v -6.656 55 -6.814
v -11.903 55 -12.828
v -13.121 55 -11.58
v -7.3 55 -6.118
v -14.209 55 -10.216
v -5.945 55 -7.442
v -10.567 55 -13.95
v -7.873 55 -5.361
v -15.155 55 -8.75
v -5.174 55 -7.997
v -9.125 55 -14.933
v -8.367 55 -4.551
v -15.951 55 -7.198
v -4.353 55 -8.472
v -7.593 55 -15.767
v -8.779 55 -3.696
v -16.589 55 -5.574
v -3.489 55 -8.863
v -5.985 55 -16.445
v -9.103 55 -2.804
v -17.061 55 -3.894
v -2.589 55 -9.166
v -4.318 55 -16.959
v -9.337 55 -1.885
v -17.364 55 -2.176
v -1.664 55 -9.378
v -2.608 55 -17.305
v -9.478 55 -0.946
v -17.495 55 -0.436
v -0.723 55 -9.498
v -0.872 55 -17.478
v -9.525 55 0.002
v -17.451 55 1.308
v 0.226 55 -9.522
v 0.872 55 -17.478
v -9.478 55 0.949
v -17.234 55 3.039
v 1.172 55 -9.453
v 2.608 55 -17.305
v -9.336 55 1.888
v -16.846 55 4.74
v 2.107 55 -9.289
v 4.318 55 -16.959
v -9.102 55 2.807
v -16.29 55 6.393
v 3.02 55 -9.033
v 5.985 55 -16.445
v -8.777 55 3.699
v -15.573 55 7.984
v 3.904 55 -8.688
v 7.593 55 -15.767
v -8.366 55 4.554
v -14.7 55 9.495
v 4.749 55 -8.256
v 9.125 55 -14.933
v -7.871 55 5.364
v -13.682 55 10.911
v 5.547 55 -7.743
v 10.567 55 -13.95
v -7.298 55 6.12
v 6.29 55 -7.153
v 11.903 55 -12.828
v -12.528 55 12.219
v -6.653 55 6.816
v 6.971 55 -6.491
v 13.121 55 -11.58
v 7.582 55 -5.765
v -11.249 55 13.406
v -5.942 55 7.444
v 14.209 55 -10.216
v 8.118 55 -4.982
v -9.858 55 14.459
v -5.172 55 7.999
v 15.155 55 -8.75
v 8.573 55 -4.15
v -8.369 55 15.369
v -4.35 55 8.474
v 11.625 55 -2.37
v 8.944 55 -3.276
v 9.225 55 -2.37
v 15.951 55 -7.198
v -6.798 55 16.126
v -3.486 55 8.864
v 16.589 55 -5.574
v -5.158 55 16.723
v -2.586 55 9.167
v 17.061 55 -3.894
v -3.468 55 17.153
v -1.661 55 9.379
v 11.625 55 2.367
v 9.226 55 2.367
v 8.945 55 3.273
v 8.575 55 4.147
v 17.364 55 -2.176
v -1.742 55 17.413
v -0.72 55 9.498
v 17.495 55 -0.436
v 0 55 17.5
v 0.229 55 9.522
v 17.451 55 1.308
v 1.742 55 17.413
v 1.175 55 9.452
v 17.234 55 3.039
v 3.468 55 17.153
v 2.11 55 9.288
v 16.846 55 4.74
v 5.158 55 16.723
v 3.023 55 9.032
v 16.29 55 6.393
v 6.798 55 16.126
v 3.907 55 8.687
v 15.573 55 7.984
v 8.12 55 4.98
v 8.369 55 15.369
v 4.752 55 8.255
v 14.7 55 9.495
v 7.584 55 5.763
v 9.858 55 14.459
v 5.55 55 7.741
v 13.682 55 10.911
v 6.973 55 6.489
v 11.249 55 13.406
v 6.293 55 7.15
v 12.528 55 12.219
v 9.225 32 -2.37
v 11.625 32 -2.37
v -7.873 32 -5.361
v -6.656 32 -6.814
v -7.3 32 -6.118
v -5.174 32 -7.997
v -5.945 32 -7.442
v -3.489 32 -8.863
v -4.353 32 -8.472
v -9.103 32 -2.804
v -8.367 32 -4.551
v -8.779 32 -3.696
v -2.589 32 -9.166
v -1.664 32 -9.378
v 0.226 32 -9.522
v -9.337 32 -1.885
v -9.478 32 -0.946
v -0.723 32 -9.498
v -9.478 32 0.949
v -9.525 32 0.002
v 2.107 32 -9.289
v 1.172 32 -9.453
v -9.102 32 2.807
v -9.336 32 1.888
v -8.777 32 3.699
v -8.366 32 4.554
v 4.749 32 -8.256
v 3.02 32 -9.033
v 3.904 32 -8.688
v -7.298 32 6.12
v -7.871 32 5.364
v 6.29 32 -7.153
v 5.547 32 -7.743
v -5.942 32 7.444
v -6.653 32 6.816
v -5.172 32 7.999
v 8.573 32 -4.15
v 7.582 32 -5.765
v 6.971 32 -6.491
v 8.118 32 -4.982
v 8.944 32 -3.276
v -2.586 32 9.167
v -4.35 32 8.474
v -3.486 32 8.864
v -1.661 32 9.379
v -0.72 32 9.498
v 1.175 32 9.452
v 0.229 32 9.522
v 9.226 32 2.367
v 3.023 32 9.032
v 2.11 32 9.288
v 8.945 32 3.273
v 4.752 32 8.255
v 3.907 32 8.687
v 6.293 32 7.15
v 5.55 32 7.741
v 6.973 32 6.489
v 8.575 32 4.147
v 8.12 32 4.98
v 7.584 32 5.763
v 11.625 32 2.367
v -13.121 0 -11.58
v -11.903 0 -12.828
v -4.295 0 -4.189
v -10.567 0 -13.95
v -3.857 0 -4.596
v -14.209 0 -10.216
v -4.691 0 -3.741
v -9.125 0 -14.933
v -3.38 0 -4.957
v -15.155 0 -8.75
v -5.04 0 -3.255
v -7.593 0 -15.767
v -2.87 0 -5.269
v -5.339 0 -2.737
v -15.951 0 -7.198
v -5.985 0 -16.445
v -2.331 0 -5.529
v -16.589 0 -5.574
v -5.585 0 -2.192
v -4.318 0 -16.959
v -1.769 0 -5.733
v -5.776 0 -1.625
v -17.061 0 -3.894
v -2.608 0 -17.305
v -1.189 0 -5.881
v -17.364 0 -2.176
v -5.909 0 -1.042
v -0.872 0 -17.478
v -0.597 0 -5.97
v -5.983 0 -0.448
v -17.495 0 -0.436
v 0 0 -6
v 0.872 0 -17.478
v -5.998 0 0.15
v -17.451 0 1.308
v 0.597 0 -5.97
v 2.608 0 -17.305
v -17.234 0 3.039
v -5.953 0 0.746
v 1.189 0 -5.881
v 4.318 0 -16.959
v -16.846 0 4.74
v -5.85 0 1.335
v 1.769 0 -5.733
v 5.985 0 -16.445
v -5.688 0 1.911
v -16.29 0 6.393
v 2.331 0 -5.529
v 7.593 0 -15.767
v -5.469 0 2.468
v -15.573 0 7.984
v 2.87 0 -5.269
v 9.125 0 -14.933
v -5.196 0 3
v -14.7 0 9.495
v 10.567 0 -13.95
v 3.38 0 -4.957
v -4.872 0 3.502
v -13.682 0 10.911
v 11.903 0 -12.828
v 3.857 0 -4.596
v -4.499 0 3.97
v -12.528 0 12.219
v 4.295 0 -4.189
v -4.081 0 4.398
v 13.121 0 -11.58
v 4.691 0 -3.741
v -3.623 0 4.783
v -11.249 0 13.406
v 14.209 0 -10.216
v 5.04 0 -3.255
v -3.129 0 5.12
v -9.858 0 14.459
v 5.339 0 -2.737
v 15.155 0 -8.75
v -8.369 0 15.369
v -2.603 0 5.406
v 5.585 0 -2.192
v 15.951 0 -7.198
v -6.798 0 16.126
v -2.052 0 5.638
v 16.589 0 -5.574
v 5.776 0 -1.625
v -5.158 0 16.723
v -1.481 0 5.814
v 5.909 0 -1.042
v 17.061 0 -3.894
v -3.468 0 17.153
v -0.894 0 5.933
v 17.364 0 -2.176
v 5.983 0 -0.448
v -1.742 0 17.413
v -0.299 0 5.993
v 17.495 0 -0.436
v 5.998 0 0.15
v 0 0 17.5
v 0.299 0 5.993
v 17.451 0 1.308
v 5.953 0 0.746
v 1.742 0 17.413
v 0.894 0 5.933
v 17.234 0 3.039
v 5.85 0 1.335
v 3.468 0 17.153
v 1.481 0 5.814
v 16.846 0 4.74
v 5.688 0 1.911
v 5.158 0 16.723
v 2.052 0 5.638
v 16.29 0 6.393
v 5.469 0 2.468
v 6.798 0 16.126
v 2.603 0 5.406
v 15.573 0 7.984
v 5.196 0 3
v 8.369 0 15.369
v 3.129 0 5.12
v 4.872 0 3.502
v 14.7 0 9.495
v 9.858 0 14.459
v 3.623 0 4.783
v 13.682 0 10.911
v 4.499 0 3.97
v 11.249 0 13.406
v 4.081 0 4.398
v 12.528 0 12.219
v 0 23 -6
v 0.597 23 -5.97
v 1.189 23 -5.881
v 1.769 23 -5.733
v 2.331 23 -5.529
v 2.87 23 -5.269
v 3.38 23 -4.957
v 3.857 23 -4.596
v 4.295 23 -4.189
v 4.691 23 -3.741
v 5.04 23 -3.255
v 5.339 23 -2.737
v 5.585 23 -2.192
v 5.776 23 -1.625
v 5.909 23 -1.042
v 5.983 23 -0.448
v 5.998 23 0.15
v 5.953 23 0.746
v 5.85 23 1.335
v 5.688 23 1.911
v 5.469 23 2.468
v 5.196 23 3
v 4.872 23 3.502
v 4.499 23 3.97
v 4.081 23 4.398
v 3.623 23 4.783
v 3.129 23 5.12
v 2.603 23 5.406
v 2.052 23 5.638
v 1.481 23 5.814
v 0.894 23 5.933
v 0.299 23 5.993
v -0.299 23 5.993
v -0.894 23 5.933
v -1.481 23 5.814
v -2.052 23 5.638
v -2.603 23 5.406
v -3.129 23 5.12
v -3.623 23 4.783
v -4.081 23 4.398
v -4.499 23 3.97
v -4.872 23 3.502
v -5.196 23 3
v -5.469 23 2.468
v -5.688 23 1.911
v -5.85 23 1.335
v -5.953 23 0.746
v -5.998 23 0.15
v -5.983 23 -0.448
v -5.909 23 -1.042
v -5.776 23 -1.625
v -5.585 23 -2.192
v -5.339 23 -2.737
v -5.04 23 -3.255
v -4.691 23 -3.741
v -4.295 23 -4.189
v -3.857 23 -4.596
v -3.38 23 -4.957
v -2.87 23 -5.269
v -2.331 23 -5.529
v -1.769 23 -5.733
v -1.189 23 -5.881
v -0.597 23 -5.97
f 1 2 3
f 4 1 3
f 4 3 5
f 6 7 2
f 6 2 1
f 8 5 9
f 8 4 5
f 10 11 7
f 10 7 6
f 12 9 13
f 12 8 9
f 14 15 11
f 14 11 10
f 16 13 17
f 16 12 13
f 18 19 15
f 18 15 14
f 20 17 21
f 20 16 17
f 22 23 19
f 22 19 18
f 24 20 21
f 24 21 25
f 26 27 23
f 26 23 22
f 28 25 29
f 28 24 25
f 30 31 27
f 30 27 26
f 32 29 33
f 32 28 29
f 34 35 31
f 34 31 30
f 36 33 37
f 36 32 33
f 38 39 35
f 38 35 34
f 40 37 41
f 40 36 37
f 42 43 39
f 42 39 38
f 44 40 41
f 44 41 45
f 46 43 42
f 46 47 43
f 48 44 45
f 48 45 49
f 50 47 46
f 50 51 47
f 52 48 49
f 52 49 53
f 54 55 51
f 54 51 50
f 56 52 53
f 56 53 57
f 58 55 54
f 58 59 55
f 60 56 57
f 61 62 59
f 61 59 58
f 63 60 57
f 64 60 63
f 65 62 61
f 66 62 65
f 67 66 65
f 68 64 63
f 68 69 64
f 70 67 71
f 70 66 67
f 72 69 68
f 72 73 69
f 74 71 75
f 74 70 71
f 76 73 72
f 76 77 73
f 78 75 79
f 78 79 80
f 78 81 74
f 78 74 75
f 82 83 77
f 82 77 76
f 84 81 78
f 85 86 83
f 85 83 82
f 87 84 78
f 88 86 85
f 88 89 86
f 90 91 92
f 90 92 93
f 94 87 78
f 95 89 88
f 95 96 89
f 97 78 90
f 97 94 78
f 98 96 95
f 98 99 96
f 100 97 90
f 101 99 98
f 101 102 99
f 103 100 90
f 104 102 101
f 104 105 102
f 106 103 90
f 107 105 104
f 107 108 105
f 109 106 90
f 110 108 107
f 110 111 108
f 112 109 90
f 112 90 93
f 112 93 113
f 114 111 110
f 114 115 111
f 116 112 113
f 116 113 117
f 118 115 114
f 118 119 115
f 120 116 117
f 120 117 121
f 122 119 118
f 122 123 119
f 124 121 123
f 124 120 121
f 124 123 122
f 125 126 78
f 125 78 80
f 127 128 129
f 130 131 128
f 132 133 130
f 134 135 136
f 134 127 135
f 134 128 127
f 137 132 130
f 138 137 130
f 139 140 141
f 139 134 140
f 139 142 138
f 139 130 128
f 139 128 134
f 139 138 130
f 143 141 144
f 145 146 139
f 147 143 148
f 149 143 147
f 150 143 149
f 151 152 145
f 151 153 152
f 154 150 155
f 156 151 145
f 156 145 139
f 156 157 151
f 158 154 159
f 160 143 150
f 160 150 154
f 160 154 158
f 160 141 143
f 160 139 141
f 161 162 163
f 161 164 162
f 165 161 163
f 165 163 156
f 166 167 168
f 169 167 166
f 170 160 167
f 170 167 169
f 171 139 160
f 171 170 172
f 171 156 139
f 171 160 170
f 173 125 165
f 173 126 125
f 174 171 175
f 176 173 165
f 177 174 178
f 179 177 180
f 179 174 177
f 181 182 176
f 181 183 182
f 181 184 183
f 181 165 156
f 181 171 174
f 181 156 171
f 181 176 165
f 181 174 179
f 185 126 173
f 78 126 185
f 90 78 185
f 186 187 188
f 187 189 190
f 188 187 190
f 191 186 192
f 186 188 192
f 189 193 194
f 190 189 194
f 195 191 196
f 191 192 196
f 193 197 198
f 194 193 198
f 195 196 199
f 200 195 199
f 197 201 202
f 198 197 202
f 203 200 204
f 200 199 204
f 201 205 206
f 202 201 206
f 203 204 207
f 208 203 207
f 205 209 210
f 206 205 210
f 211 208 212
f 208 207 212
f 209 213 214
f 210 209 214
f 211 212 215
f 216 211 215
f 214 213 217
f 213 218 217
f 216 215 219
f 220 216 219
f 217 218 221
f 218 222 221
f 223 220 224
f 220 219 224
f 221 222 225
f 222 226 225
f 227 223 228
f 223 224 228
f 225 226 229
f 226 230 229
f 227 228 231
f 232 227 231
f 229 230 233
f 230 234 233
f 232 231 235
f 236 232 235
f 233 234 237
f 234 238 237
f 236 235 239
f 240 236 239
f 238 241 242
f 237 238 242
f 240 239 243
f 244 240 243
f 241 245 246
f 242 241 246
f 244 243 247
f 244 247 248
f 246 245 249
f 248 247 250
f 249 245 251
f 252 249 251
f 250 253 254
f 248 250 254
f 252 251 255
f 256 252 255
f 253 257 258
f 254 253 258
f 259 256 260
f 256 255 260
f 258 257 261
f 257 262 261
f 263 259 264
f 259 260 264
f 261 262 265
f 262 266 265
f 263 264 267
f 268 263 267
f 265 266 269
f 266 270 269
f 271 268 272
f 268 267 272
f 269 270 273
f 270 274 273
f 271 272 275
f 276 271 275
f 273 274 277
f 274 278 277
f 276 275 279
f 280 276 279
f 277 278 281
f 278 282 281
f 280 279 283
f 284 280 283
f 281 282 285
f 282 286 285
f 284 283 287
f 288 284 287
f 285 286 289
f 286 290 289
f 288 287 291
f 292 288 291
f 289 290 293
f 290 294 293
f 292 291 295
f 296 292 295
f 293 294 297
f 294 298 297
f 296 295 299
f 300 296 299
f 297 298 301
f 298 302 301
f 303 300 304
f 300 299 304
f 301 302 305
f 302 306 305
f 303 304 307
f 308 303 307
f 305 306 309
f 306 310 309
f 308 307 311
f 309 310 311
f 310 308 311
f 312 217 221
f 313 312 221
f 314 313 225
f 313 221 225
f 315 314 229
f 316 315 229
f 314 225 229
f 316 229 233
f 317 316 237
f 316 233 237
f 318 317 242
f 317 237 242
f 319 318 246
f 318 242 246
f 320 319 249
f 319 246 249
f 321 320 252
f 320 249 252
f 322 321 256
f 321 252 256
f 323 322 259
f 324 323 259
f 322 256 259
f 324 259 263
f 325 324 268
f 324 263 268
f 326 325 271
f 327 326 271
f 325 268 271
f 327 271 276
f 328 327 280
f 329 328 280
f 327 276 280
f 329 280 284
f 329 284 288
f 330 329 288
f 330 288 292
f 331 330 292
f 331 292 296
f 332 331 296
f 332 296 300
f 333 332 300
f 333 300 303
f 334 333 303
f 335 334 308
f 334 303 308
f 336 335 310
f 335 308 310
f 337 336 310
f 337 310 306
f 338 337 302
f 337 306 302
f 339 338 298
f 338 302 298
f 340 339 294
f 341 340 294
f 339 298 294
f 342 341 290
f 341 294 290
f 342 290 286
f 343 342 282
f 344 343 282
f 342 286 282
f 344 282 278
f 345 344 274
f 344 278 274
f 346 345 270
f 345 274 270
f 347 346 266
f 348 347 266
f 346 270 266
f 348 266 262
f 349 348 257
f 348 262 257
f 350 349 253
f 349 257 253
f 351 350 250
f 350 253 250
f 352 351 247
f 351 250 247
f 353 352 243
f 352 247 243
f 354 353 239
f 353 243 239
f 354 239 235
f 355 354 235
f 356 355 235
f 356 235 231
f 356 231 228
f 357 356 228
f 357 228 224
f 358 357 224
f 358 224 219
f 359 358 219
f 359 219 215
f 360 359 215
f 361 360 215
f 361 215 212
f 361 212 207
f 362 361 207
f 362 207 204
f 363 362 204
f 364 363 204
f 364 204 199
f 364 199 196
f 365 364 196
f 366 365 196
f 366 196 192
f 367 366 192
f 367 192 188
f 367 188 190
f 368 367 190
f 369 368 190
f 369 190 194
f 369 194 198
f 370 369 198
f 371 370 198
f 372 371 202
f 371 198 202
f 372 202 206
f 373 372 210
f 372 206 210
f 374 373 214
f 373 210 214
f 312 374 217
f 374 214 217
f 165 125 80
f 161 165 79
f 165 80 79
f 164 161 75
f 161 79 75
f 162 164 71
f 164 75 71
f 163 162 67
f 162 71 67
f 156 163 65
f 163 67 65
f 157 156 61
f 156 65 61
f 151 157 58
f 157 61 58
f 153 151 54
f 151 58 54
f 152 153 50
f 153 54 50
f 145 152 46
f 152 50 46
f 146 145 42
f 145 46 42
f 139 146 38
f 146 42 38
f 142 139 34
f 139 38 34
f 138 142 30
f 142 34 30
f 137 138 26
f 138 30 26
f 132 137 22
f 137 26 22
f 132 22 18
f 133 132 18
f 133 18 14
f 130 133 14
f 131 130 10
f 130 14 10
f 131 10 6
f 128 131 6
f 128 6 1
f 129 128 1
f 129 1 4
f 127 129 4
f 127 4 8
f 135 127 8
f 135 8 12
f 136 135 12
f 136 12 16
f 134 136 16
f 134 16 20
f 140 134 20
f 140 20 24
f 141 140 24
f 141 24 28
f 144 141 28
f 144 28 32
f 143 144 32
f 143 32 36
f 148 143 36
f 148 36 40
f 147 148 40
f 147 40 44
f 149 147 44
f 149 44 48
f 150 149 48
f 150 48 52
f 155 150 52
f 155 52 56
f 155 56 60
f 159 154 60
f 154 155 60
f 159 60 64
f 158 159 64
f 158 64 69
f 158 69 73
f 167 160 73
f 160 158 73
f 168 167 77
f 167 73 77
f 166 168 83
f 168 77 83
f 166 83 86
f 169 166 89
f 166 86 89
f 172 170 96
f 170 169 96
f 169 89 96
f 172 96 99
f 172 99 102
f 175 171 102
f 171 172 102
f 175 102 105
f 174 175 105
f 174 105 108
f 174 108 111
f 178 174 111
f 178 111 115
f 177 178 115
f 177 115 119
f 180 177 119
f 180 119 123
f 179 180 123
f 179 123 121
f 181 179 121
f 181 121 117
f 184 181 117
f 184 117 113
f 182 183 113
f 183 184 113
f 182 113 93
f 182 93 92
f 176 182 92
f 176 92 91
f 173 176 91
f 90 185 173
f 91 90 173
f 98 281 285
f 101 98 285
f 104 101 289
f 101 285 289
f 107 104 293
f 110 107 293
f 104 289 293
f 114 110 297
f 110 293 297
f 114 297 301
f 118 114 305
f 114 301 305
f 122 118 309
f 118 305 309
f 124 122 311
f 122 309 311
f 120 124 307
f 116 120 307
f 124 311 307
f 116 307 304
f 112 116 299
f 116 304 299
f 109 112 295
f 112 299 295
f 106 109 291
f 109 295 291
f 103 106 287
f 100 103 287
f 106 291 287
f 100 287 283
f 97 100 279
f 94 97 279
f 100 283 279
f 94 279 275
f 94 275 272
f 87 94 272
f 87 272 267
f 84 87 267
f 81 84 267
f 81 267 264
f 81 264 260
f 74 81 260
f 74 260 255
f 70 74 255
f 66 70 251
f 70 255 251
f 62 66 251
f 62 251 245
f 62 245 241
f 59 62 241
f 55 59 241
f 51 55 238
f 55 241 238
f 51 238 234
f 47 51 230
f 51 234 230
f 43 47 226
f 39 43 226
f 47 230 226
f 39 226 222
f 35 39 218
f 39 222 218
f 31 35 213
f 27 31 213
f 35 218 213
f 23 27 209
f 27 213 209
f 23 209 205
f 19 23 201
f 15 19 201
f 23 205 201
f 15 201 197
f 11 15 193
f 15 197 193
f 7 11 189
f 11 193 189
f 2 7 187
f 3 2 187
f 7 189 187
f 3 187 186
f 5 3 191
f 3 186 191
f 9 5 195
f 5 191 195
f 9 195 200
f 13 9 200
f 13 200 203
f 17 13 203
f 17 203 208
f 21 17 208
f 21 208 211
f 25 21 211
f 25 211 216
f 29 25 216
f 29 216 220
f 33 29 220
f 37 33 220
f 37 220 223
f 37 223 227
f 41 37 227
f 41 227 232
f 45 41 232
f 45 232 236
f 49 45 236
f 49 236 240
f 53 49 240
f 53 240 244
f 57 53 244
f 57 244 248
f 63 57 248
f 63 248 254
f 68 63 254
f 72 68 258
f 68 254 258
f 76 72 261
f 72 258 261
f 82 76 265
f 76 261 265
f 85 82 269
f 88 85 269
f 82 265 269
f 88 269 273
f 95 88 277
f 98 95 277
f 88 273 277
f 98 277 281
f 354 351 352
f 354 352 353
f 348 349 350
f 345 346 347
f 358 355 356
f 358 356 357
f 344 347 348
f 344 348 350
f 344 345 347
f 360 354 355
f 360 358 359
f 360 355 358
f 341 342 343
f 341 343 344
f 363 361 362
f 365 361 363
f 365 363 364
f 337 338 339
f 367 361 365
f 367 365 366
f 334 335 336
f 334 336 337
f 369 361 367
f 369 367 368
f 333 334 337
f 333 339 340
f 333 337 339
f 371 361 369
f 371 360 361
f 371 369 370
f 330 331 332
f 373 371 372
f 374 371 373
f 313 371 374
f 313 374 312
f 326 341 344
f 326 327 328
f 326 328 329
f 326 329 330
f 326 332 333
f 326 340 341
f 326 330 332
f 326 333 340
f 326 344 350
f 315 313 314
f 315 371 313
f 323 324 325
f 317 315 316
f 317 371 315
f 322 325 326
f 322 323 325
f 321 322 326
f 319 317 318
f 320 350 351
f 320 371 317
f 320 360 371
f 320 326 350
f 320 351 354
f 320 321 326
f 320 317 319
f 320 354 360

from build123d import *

# Parameters (mm, degrees)
SKETCH1_R           = 17.5
BOSS_EXTRUDE1_DEPTH = 55
SKETCH2_R           = 9.525
CUT_EXTRUDE1_DEPTH  = 23
CUT_EXTRUDE2_REACH  = 42.454
SKETCH5_R           = 6
CUT_EXTRUDE3_DEPTH  = 23


with BuildPart() as part:
    # Sketch1 → Boss-Extrude1 (new body)
    with BuildSketch(Plane(origin=(0, 0, 0), x_dir=(1, 0, 0), z_dir=(0, 1, 0))):
        with Locations(Location((0, 0, 0), (0, 0, 270))):
            Circle(SKETCH1_R)
    extrude(amount=BOSS_EXTRUDE1_DEPTH)

    # Sketch2 → Cut-Extrude1 (cut)
    with BuildSketch(Plane(origin=(0, 55, 0), x_dir=(1, 0, 0), z_dir=(0, 1, 0))):
        with Locations(Location((0, 0, 0), (0, 0, 270))):
            Circle(SKETCH2_R)
    extrude(amount=-CUT_EXTRUDE1_DEPTH, mode=Mode.SUBTRACT)

    # Sketch3 → Cut-Extrude2 (cut, up to next)
    with BuildSketch(Plane(origin=(0, 32, 0), x_dir=(1, 0, 0), z_dir=(0, 1, 0)), mode=Mode.PRIVATE) as cut_extrude2_sk1:
        Polygon((9.525, 2.37), (11.625, 2.37), (11.625, -2.366924295), (6.895, -2.366924295), (6.895, 2.37), align=None)
    cut_extrude2_tool1 = extrude(cut_extrude2_sk1.sketch, amount=CUT_EXTRUDE2_REACH, mode=Mode.PRIVATE) & part.part
    add(cut_extrude2_tool1.solids().sort_by_distance((9.26, 32, -0.001538))[0], mode=Mode.SUBTRACT)

    # Sketch5 → Cut-Extrude3 (cut)
    with BuildSketch(Plane(origin=(0, 0, 0), x_dir=(-1, 0, 0), z_dir=(0, -1, 0))):
        with Locations(Location((0, 0, 0), (0, 0, 90))):
            Circle(SKETCH5_R)
    extrude(amount=-CUT_EXTRUDE3_DEPTH, mode=Mode.SUBTRACT)


solid = part.part
